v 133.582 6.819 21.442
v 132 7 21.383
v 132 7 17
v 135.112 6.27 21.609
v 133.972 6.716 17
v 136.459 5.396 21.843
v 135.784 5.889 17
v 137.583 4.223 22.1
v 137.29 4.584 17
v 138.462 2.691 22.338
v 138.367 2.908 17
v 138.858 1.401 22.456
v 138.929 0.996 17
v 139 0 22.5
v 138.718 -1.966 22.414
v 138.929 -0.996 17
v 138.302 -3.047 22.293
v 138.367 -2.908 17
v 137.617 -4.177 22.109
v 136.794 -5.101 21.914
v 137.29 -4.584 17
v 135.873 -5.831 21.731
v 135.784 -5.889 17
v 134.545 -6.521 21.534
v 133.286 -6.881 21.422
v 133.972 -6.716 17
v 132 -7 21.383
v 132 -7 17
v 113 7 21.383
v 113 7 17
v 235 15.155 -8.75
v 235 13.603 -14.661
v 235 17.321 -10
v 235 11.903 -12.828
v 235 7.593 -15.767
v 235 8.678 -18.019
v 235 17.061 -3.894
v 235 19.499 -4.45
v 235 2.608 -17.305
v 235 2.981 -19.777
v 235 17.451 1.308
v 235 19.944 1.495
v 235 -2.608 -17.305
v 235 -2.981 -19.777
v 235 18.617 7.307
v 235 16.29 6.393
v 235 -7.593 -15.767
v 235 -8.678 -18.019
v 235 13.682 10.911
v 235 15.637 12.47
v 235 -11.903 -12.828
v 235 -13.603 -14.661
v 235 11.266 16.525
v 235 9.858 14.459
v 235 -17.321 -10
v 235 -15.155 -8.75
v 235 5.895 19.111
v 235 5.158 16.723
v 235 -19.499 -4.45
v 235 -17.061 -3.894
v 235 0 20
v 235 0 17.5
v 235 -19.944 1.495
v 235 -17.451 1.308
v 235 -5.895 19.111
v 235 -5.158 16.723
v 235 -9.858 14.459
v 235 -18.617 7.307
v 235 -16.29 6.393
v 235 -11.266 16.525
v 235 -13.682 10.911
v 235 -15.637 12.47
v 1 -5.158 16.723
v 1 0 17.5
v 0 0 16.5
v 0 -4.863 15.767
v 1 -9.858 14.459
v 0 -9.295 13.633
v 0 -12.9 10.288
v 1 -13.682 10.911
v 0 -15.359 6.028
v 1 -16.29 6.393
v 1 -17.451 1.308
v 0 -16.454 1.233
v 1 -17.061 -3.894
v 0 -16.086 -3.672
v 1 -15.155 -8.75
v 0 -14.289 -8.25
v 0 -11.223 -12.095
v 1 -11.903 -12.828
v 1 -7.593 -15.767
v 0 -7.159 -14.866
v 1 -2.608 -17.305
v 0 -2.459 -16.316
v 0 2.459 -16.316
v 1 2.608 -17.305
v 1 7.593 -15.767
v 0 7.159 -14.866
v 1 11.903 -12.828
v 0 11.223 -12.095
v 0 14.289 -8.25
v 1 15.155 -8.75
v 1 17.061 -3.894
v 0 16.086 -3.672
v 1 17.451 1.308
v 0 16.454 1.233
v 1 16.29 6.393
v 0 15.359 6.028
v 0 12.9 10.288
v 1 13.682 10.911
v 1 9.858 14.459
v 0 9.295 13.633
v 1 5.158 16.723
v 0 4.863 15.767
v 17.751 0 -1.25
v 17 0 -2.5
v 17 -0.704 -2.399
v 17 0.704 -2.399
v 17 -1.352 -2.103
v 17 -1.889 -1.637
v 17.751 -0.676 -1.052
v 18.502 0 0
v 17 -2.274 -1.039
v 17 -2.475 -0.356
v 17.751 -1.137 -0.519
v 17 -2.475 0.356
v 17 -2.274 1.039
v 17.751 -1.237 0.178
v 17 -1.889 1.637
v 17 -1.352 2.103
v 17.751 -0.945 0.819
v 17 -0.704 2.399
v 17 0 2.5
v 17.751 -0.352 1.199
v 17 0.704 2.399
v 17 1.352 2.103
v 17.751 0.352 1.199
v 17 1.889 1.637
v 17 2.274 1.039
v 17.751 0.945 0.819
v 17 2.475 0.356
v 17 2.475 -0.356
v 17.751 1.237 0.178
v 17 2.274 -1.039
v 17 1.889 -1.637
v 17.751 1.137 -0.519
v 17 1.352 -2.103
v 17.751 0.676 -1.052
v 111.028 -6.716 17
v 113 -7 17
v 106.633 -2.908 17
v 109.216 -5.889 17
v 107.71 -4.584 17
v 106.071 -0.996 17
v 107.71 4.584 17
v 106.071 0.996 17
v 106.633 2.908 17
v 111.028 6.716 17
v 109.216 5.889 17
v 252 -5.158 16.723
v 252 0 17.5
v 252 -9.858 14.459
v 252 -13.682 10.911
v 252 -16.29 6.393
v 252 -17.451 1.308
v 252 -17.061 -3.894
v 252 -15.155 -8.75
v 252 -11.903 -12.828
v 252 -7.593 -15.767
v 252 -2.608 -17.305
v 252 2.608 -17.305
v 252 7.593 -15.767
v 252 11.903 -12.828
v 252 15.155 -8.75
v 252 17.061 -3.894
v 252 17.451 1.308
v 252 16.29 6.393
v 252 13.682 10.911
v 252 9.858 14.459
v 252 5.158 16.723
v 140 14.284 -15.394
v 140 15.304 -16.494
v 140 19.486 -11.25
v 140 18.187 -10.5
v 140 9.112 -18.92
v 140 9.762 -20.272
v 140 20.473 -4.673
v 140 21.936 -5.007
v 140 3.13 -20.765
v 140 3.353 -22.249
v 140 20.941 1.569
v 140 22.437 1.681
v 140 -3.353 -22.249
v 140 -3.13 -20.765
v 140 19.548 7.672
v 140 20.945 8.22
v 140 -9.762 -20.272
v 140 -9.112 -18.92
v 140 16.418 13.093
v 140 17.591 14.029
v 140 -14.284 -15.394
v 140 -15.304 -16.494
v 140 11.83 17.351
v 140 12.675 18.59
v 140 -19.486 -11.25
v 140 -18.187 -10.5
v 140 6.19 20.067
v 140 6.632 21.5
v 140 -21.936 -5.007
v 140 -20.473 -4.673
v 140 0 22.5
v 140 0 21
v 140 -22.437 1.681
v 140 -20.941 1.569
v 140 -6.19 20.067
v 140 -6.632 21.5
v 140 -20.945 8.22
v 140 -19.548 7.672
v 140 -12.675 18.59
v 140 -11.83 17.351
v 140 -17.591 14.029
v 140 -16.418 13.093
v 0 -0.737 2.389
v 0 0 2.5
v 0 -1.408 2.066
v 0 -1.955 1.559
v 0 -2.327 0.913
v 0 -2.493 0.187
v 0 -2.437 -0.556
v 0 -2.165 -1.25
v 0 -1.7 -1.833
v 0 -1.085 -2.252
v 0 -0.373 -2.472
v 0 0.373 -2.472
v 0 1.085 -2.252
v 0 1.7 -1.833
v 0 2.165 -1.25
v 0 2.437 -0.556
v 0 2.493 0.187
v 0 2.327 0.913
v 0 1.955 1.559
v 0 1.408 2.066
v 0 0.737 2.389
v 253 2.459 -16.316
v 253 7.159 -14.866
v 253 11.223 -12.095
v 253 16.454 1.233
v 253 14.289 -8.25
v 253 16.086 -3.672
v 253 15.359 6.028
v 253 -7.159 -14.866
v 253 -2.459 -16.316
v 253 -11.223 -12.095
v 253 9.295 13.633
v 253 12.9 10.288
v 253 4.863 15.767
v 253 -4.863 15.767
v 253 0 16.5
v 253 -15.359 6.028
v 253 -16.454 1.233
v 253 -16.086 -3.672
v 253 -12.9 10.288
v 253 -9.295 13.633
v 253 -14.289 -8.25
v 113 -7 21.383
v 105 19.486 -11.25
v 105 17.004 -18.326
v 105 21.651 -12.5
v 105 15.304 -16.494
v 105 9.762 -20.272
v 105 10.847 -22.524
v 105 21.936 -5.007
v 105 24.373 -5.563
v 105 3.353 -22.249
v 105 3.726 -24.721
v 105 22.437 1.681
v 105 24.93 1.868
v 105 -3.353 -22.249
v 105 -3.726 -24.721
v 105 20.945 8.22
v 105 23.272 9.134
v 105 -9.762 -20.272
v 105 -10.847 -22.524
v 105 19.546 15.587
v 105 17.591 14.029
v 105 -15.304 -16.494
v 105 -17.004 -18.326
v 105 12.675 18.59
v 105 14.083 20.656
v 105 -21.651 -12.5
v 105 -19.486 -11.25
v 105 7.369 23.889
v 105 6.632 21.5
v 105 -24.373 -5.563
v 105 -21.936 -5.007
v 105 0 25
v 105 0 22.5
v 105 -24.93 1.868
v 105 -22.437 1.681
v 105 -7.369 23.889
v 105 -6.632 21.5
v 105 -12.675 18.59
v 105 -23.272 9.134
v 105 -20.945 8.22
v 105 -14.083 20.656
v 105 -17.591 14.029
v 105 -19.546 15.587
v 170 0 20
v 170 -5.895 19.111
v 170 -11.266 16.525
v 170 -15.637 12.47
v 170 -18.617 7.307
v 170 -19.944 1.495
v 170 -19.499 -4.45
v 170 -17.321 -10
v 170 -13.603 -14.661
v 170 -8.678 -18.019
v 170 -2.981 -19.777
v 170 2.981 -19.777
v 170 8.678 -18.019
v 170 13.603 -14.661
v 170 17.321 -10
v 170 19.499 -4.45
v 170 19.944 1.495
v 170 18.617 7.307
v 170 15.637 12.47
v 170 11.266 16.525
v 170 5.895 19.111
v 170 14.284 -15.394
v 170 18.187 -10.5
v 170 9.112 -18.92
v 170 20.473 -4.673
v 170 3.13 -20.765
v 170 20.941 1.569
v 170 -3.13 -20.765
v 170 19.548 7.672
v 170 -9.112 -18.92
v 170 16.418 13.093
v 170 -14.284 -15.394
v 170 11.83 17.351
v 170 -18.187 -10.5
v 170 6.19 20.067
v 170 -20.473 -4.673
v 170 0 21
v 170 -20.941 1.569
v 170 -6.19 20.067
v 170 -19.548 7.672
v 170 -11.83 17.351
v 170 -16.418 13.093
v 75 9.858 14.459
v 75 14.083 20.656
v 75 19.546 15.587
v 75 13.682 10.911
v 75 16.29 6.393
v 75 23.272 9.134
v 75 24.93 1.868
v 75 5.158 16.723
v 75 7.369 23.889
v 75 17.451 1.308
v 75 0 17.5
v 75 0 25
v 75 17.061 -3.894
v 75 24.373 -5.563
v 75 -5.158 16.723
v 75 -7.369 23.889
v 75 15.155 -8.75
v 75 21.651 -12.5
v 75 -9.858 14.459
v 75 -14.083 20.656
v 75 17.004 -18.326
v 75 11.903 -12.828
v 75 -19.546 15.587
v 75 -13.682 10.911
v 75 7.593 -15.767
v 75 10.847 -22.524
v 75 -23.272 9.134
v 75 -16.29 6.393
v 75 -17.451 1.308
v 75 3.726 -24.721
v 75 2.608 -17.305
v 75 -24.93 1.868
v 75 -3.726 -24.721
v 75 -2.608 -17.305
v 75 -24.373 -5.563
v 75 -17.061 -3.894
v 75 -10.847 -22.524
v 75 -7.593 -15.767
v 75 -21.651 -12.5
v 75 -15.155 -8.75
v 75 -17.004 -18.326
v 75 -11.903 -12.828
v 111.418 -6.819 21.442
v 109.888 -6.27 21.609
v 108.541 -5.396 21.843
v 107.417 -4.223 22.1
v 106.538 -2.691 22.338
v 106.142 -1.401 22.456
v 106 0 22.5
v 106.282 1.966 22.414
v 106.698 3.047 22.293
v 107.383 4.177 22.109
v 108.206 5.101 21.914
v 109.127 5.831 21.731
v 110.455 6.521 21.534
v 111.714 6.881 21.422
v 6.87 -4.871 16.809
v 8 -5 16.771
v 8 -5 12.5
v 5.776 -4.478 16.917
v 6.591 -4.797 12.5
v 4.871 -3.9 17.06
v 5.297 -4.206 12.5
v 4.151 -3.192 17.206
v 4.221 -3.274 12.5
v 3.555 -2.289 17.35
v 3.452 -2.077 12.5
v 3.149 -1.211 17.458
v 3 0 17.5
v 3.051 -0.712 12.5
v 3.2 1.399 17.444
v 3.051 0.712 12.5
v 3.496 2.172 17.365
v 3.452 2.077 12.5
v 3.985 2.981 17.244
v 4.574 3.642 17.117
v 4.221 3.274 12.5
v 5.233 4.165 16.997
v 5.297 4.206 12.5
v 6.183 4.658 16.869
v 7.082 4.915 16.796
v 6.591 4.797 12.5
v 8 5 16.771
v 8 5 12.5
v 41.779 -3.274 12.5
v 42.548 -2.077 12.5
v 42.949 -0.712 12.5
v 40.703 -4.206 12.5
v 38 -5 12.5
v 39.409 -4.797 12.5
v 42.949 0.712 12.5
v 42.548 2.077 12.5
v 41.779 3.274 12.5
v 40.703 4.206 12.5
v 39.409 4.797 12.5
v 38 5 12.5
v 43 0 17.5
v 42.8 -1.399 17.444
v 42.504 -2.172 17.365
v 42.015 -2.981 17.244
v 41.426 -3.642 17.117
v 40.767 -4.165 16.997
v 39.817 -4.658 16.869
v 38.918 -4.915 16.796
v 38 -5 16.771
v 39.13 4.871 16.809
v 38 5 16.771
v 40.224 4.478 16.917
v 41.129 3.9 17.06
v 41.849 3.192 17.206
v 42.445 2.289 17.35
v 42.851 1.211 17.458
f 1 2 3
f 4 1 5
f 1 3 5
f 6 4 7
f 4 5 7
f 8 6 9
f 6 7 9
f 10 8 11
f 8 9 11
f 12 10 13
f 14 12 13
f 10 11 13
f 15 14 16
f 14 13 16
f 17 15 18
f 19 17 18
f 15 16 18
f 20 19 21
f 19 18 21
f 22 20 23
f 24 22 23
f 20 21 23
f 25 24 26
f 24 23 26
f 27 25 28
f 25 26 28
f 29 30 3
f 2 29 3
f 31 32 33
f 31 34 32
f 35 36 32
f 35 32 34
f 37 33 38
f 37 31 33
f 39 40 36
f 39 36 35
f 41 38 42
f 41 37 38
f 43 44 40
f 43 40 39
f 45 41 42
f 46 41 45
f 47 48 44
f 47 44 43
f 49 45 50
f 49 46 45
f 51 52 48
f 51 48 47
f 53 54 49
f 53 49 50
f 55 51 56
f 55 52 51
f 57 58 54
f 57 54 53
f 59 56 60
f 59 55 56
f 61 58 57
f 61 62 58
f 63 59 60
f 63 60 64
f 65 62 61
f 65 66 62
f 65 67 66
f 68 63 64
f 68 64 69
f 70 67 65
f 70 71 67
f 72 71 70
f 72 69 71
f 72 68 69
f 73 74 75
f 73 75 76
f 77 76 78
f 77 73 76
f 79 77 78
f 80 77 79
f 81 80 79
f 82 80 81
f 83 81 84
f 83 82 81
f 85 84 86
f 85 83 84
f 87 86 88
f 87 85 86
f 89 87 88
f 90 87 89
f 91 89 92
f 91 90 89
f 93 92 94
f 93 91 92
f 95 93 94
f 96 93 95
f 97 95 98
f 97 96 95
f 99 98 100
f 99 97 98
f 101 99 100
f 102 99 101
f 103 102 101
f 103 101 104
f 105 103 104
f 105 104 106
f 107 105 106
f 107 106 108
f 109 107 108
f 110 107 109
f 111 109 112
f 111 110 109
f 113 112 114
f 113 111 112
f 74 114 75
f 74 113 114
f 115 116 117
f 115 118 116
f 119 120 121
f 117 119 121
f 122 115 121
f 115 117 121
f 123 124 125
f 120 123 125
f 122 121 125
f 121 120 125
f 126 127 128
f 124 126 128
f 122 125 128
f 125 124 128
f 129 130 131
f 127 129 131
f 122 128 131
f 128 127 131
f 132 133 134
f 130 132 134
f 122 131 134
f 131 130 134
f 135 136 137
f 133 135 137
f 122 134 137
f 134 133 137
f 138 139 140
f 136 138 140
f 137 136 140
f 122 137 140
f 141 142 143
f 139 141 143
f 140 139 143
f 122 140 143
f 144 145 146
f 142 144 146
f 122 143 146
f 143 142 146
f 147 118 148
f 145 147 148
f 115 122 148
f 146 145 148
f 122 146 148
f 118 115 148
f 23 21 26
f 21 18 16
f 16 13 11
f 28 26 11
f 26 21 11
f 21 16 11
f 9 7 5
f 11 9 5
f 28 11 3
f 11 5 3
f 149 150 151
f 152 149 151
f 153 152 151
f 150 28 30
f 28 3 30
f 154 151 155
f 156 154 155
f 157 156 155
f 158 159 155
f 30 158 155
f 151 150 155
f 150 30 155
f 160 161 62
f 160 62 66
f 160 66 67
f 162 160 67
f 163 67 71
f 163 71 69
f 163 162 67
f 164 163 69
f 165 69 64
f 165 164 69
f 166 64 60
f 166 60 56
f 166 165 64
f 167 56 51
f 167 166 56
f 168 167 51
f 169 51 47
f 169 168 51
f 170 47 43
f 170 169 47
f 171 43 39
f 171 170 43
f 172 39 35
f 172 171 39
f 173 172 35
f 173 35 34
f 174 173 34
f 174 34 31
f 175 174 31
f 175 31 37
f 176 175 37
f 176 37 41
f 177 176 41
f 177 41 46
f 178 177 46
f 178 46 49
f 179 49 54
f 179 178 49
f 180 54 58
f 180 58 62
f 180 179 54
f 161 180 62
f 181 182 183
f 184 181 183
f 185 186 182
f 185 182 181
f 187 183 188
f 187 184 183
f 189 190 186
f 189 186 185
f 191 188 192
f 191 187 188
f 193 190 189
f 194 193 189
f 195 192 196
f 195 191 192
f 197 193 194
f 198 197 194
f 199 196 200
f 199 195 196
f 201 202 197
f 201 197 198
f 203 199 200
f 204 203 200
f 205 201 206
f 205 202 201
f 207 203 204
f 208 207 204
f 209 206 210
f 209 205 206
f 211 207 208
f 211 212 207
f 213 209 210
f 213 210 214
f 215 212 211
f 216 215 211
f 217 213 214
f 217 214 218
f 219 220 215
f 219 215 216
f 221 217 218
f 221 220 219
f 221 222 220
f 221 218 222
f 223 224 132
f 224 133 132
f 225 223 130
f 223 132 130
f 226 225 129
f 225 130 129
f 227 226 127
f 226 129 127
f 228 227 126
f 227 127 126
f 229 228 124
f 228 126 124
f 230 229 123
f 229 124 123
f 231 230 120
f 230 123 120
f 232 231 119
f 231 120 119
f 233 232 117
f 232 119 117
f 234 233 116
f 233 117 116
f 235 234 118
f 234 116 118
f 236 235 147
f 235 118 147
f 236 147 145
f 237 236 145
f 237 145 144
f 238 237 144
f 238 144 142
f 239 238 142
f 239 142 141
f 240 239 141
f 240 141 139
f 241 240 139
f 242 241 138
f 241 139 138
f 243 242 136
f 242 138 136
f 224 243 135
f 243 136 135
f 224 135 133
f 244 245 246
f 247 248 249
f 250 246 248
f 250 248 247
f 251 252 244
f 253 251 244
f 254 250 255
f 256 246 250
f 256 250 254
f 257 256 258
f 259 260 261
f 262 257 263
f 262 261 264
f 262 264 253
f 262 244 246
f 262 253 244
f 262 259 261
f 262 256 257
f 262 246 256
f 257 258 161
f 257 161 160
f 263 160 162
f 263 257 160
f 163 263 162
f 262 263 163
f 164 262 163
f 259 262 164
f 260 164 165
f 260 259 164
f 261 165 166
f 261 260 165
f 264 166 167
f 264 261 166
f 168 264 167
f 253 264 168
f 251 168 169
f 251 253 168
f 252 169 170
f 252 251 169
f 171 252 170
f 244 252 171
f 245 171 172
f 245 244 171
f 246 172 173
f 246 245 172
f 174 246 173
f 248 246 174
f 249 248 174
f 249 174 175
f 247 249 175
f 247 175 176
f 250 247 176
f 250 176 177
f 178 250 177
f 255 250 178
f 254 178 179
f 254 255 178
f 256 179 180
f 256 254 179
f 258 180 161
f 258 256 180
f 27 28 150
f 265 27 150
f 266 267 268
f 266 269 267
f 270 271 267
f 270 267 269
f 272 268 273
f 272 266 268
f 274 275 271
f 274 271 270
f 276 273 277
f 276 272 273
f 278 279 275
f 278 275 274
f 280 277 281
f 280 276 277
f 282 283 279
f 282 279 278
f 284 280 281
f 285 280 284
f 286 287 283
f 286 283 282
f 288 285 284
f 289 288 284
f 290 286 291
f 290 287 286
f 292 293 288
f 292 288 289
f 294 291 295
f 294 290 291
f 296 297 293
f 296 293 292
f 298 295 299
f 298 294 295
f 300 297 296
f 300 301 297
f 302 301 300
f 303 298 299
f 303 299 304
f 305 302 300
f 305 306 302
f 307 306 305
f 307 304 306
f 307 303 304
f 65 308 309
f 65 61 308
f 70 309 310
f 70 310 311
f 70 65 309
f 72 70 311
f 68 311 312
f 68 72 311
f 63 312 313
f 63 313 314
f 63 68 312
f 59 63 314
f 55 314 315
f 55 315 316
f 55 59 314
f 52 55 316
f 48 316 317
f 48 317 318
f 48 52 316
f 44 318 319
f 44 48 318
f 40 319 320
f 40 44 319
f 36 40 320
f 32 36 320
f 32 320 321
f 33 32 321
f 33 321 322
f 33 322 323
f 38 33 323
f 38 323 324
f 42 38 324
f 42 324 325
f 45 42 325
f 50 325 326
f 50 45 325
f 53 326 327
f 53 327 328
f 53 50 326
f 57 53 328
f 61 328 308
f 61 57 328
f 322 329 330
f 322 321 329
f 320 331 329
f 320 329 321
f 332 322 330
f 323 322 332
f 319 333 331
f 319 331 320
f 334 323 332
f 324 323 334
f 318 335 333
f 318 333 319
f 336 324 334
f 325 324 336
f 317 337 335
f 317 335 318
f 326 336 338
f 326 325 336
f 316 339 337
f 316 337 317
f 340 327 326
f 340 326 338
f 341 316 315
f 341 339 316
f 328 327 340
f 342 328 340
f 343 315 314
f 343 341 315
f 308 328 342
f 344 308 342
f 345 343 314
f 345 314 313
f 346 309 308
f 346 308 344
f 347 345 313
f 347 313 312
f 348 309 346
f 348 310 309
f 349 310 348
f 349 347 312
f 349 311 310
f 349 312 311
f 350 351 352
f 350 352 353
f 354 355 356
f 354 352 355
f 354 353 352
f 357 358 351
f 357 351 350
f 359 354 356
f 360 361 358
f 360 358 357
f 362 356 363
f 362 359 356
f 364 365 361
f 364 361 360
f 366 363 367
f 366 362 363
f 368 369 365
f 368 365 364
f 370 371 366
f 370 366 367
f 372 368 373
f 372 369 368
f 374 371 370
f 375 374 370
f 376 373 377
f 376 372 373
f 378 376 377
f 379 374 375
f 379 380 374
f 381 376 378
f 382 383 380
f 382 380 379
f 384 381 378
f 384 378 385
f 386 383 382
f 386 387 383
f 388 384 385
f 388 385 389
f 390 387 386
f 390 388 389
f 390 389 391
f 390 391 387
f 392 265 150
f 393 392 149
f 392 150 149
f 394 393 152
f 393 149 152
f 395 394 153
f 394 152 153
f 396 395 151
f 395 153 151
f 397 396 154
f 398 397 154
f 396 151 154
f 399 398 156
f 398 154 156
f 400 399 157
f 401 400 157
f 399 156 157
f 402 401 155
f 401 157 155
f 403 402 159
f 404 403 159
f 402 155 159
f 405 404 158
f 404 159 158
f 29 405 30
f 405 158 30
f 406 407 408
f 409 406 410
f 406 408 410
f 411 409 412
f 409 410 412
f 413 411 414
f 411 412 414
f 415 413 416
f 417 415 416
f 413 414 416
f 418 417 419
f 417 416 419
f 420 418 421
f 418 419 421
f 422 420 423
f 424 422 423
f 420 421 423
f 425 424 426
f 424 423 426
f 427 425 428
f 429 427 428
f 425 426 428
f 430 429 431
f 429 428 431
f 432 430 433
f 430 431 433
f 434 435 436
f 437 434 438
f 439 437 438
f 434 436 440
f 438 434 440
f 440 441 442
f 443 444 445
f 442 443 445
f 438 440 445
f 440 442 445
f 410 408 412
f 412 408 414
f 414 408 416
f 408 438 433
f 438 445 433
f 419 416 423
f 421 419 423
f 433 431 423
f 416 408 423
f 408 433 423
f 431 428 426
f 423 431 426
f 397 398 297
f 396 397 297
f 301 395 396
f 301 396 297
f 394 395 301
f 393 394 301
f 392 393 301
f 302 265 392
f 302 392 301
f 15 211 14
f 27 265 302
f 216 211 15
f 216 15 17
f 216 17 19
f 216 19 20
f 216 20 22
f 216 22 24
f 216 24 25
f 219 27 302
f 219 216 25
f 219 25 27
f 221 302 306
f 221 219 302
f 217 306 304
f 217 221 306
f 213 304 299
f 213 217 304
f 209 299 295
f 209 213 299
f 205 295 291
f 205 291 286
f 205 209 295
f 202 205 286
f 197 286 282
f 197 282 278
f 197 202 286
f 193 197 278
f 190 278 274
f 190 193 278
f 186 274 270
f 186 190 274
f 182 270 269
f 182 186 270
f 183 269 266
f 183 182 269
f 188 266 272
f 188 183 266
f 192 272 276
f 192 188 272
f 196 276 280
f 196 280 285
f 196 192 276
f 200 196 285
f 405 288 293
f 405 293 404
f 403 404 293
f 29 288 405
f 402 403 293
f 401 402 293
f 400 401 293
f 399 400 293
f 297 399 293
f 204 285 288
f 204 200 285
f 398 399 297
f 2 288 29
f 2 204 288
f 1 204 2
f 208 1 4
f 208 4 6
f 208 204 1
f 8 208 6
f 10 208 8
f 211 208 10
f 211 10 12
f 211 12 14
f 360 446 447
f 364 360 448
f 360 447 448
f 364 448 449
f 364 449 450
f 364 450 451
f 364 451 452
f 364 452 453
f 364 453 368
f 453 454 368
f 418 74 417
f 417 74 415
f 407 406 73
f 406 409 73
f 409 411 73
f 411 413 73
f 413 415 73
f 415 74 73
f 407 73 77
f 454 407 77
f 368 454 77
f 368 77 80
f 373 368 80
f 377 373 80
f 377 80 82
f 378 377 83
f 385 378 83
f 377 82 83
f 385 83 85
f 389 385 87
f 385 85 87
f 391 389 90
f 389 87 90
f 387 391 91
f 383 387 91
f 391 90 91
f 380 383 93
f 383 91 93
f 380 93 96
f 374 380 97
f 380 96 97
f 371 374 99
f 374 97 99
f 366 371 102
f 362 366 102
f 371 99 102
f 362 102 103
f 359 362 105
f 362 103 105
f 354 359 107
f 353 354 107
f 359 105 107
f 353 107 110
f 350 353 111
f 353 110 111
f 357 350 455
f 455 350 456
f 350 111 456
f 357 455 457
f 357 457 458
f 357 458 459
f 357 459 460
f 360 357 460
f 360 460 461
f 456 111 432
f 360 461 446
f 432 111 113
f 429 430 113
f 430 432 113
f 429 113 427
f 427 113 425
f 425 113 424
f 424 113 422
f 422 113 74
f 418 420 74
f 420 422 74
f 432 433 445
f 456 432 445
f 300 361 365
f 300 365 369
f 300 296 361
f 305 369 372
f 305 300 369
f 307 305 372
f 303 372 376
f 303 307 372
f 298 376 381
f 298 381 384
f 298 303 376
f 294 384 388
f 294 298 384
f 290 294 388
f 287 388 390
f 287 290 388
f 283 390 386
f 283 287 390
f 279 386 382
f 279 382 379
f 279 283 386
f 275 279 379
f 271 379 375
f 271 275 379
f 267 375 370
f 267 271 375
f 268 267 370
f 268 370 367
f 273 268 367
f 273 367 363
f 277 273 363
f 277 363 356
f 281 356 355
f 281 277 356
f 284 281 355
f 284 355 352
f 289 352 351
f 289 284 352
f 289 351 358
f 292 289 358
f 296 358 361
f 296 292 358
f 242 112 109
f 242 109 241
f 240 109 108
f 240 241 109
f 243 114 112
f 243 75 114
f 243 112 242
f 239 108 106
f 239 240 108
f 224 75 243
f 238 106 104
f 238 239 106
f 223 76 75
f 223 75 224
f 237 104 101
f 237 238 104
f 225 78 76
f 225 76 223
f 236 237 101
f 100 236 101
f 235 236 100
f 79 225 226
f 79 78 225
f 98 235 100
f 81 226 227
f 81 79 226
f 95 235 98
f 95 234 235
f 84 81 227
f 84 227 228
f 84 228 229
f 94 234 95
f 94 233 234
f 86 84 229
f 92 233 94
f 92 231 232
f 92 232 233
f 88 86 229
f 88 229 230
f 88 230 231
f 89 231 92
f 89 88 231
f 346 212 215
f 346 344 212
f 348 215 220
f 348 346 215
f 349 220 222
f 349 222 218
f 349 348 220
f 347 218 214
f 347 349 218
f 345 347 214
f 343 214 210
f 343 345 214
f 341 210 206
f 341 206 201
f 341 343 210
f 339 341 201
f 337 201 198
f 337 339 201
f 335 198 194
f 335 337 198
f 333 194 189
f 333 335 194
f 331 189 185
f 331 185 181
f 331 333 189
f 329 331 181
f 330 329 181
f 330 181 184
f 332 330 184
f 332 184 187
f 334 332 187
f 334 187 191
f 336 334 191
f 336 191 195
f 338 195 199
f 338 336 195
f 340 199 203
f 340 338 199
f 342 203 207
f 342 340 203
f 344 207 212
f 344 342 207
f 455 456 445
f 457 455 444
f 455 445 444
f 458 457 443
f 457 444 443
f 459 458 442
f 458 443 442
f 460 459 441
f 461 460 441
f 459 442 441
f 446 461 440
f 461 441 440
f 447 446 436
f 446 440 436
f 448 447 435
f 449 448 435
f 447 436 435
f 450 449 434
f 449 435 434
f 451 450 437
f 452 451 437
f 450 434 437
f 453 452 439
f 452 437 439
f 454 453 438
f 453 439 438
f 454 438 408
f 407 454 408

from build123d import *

# Parameters (mm, degrees)
HOLE_WIZARD_M6_1_D     = 5
HOLE_WIZARD_M6_1_DEPTH = 17
HOLE_WIZARD_M6_1_TIP   = 1.502151548
CUT_EXTRUDE_1_DEPTH    = 10
CUT_EXTRUDE_2_DEPTH    = 10
CHAMFER_1_SIZE         = 1


with BuildPart() as part:
    # 草图1 → 旋转1 (revolve)
    with BuildSketch(Plane.XY, mode=Mode.PRIVATE) as revolve_1_sk:
        Polygon((0, 0), (0, 17.5), (45, 17.5), (75, 17.5), (75, 25), (105, 25), (105, 22.5), (140, 22.5), (140, 21), (170, 21), (170, 20), (235, 20), (235, 17.5), (253, 17.5), (253, 0), align=None)
    revolve(revolve_1_sk.sketch.rotate(Axis((0, 0, 0), (1, 0, 0)), 90), axis=Axis((0, 0, 0), (1, 0, 0)))

    # M6 螺纹孔1
    with Locations(Plane(origin=(0, 0, 0), x_dir=(0, 0, -1), z_dir=(-1, 0, 0))):
        with Locations((0, 0)):
            Hole(HOLE_WIZARD_M6_1_D / 2, depth=HOLE_WIZARD_M6_1_DEPTH)
            with Locations((0, 0, -(HOLE_WIZARD_M6_1_DEPTH + HOLE_WIZARD_M6_1_TIP / 2))):  # 118° drill point
                Cone(0, HOLE_WIZARD_M6_1_D / 2, HOLE_WIZARD_M6_1_TIP, mode=Mode.SUBTRACT)

    # 草图4 → 切除-拉伸1 (cut)
    with BuildSketch(Plane.XY.offset(17)):
        with BuildLine():
            Line((113, 7), (132, 7))
            ThreePointArc((132, 7), (139, 0), (132, -7))
            Line((132, -7), (113, -7))
            ThreePointArc((113, -7), (106, 0), (113, 7))
        make_face()
    extrude(amount=CUT_EXTRUDE_1_DEPTH, mode=Mode.SUBTRACT)

    # 草图5 → 切除-拉伸2 (cut)
    with BuildSketch(Plane.XY.offset(12.5)):
        with BuildLine():
            Line((8, 5), (38, 5))
            ThreePointArc((38, 5), (43, 0), (38, -5))
            Line((38, -5), (8, -5))
            ThreePointArc((8, -5), (3, 0), (8, 5))
        make_face()
    extrude(amount=CUT_EXTRUDE_2_DEPTH, mode=Mode.SUBTRACT)

    # 倒角1
    chamfer_1_edges = [part.edges().sort_by_distance(p)[0] for p in [
        (253, 0, -17.5),
        (0, 0, -17.5),
    ]]
    chamfer(chamfer_1_edges, length=CHAMFER_1_SIZE)


solid = part.part
